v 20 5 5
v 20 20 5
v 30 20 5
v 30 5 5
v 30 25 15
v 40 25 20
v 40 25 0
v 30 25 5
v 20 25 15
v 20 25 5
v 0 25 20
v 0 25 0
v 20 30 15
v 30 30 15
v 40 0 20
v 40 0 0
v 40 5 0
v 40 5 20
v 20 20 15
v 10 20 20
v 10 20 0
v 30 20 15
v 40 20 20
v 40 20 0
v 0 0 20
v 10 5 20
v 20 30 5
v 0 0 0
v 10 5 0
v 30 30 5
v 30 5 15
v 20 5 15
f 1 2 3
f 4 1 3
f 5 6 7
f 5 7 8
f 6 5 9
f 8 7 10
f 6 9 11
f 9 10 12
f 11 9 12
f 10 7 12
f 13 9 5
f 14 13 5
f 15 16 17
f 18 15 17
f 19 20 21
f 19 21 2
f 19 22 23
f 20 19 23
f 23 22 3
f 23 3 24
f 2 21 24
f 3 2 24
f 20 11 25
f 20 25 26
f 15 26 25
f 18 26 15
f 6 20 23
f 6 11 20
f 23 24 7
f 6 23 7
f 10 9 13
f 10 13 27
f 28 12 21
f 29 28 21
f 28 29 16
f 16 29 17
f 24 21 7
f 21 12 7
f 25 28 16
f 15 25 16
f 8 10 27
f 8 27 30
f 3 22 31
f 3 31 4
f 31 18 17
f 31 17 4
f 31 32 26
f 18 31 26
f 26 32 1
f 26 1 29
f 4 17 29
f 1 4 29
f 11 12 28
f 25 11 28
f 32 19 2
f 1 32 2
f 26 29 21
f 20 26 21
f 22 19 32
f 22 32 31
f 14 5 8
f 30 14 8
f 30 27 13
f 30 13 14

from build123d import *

# Parameters (mm, degrees)
BOSS_EXTRUDE1_DEPTH             = 20
SKETCH2_W                       = 10
SKETCH2_H                       = 10
BOSS_EXTRUDE2_DEPTH             = 5
BOSS_EXTRUDE2_DIRECTION_2_REACH = 53.235


with BuildPart() as part:
    # Sketch1 → Boss-Extrude1 (new body)
    with BuildSketch(Plane.XY):
        Polygon((0, 0), (40, 0), (40, 5), (10, 5), (10, 20), (40, 20), (40, 25), (0, 25), align=None)
    extrude(amount=BOSS_EXTRUDE1_DEPTH)

    # Sketch2 → Boss-Extrude2 (add)
    with BuildSketch(Plane(origin=(0, 25, 0), x_dir=(1, 0, 0), z_dir=(0, 1, 0))):
        with Locations((25, -10)):
            Rectangle(SKETCH2_W, SKETCH2_H)
    extrude(amount=BOSS_EXTRUDE2_DEPTH)

    # Sketch2 → Boss-Extrude2 direction 2 (add, up to next)
    with BuildSketch(Plane(origin=(0, 25, 0), x_dir=(1, 0, 0), z_dir=(0, 1, 0)), mode=Mode.PRIVATE) as boss_extrude2_direction_2_sk1:
        with Locations((25, -10)):
            Rectangle(SKETCH2_W, SKETCH2_H)
    boss_extrude2_direction_2_tool1 = extrude(boss_extrude2_direction_2_sk1.sketch, amount=-BOSS_EXTRUDE2_DIRECTION_2_REACH, mode=Mode.PRIVATE) - part.part
    add(boss_extrude2_direction_2_tool1.solids().sort_by_distance((25, 25, 10))[0])


solid = part.part
